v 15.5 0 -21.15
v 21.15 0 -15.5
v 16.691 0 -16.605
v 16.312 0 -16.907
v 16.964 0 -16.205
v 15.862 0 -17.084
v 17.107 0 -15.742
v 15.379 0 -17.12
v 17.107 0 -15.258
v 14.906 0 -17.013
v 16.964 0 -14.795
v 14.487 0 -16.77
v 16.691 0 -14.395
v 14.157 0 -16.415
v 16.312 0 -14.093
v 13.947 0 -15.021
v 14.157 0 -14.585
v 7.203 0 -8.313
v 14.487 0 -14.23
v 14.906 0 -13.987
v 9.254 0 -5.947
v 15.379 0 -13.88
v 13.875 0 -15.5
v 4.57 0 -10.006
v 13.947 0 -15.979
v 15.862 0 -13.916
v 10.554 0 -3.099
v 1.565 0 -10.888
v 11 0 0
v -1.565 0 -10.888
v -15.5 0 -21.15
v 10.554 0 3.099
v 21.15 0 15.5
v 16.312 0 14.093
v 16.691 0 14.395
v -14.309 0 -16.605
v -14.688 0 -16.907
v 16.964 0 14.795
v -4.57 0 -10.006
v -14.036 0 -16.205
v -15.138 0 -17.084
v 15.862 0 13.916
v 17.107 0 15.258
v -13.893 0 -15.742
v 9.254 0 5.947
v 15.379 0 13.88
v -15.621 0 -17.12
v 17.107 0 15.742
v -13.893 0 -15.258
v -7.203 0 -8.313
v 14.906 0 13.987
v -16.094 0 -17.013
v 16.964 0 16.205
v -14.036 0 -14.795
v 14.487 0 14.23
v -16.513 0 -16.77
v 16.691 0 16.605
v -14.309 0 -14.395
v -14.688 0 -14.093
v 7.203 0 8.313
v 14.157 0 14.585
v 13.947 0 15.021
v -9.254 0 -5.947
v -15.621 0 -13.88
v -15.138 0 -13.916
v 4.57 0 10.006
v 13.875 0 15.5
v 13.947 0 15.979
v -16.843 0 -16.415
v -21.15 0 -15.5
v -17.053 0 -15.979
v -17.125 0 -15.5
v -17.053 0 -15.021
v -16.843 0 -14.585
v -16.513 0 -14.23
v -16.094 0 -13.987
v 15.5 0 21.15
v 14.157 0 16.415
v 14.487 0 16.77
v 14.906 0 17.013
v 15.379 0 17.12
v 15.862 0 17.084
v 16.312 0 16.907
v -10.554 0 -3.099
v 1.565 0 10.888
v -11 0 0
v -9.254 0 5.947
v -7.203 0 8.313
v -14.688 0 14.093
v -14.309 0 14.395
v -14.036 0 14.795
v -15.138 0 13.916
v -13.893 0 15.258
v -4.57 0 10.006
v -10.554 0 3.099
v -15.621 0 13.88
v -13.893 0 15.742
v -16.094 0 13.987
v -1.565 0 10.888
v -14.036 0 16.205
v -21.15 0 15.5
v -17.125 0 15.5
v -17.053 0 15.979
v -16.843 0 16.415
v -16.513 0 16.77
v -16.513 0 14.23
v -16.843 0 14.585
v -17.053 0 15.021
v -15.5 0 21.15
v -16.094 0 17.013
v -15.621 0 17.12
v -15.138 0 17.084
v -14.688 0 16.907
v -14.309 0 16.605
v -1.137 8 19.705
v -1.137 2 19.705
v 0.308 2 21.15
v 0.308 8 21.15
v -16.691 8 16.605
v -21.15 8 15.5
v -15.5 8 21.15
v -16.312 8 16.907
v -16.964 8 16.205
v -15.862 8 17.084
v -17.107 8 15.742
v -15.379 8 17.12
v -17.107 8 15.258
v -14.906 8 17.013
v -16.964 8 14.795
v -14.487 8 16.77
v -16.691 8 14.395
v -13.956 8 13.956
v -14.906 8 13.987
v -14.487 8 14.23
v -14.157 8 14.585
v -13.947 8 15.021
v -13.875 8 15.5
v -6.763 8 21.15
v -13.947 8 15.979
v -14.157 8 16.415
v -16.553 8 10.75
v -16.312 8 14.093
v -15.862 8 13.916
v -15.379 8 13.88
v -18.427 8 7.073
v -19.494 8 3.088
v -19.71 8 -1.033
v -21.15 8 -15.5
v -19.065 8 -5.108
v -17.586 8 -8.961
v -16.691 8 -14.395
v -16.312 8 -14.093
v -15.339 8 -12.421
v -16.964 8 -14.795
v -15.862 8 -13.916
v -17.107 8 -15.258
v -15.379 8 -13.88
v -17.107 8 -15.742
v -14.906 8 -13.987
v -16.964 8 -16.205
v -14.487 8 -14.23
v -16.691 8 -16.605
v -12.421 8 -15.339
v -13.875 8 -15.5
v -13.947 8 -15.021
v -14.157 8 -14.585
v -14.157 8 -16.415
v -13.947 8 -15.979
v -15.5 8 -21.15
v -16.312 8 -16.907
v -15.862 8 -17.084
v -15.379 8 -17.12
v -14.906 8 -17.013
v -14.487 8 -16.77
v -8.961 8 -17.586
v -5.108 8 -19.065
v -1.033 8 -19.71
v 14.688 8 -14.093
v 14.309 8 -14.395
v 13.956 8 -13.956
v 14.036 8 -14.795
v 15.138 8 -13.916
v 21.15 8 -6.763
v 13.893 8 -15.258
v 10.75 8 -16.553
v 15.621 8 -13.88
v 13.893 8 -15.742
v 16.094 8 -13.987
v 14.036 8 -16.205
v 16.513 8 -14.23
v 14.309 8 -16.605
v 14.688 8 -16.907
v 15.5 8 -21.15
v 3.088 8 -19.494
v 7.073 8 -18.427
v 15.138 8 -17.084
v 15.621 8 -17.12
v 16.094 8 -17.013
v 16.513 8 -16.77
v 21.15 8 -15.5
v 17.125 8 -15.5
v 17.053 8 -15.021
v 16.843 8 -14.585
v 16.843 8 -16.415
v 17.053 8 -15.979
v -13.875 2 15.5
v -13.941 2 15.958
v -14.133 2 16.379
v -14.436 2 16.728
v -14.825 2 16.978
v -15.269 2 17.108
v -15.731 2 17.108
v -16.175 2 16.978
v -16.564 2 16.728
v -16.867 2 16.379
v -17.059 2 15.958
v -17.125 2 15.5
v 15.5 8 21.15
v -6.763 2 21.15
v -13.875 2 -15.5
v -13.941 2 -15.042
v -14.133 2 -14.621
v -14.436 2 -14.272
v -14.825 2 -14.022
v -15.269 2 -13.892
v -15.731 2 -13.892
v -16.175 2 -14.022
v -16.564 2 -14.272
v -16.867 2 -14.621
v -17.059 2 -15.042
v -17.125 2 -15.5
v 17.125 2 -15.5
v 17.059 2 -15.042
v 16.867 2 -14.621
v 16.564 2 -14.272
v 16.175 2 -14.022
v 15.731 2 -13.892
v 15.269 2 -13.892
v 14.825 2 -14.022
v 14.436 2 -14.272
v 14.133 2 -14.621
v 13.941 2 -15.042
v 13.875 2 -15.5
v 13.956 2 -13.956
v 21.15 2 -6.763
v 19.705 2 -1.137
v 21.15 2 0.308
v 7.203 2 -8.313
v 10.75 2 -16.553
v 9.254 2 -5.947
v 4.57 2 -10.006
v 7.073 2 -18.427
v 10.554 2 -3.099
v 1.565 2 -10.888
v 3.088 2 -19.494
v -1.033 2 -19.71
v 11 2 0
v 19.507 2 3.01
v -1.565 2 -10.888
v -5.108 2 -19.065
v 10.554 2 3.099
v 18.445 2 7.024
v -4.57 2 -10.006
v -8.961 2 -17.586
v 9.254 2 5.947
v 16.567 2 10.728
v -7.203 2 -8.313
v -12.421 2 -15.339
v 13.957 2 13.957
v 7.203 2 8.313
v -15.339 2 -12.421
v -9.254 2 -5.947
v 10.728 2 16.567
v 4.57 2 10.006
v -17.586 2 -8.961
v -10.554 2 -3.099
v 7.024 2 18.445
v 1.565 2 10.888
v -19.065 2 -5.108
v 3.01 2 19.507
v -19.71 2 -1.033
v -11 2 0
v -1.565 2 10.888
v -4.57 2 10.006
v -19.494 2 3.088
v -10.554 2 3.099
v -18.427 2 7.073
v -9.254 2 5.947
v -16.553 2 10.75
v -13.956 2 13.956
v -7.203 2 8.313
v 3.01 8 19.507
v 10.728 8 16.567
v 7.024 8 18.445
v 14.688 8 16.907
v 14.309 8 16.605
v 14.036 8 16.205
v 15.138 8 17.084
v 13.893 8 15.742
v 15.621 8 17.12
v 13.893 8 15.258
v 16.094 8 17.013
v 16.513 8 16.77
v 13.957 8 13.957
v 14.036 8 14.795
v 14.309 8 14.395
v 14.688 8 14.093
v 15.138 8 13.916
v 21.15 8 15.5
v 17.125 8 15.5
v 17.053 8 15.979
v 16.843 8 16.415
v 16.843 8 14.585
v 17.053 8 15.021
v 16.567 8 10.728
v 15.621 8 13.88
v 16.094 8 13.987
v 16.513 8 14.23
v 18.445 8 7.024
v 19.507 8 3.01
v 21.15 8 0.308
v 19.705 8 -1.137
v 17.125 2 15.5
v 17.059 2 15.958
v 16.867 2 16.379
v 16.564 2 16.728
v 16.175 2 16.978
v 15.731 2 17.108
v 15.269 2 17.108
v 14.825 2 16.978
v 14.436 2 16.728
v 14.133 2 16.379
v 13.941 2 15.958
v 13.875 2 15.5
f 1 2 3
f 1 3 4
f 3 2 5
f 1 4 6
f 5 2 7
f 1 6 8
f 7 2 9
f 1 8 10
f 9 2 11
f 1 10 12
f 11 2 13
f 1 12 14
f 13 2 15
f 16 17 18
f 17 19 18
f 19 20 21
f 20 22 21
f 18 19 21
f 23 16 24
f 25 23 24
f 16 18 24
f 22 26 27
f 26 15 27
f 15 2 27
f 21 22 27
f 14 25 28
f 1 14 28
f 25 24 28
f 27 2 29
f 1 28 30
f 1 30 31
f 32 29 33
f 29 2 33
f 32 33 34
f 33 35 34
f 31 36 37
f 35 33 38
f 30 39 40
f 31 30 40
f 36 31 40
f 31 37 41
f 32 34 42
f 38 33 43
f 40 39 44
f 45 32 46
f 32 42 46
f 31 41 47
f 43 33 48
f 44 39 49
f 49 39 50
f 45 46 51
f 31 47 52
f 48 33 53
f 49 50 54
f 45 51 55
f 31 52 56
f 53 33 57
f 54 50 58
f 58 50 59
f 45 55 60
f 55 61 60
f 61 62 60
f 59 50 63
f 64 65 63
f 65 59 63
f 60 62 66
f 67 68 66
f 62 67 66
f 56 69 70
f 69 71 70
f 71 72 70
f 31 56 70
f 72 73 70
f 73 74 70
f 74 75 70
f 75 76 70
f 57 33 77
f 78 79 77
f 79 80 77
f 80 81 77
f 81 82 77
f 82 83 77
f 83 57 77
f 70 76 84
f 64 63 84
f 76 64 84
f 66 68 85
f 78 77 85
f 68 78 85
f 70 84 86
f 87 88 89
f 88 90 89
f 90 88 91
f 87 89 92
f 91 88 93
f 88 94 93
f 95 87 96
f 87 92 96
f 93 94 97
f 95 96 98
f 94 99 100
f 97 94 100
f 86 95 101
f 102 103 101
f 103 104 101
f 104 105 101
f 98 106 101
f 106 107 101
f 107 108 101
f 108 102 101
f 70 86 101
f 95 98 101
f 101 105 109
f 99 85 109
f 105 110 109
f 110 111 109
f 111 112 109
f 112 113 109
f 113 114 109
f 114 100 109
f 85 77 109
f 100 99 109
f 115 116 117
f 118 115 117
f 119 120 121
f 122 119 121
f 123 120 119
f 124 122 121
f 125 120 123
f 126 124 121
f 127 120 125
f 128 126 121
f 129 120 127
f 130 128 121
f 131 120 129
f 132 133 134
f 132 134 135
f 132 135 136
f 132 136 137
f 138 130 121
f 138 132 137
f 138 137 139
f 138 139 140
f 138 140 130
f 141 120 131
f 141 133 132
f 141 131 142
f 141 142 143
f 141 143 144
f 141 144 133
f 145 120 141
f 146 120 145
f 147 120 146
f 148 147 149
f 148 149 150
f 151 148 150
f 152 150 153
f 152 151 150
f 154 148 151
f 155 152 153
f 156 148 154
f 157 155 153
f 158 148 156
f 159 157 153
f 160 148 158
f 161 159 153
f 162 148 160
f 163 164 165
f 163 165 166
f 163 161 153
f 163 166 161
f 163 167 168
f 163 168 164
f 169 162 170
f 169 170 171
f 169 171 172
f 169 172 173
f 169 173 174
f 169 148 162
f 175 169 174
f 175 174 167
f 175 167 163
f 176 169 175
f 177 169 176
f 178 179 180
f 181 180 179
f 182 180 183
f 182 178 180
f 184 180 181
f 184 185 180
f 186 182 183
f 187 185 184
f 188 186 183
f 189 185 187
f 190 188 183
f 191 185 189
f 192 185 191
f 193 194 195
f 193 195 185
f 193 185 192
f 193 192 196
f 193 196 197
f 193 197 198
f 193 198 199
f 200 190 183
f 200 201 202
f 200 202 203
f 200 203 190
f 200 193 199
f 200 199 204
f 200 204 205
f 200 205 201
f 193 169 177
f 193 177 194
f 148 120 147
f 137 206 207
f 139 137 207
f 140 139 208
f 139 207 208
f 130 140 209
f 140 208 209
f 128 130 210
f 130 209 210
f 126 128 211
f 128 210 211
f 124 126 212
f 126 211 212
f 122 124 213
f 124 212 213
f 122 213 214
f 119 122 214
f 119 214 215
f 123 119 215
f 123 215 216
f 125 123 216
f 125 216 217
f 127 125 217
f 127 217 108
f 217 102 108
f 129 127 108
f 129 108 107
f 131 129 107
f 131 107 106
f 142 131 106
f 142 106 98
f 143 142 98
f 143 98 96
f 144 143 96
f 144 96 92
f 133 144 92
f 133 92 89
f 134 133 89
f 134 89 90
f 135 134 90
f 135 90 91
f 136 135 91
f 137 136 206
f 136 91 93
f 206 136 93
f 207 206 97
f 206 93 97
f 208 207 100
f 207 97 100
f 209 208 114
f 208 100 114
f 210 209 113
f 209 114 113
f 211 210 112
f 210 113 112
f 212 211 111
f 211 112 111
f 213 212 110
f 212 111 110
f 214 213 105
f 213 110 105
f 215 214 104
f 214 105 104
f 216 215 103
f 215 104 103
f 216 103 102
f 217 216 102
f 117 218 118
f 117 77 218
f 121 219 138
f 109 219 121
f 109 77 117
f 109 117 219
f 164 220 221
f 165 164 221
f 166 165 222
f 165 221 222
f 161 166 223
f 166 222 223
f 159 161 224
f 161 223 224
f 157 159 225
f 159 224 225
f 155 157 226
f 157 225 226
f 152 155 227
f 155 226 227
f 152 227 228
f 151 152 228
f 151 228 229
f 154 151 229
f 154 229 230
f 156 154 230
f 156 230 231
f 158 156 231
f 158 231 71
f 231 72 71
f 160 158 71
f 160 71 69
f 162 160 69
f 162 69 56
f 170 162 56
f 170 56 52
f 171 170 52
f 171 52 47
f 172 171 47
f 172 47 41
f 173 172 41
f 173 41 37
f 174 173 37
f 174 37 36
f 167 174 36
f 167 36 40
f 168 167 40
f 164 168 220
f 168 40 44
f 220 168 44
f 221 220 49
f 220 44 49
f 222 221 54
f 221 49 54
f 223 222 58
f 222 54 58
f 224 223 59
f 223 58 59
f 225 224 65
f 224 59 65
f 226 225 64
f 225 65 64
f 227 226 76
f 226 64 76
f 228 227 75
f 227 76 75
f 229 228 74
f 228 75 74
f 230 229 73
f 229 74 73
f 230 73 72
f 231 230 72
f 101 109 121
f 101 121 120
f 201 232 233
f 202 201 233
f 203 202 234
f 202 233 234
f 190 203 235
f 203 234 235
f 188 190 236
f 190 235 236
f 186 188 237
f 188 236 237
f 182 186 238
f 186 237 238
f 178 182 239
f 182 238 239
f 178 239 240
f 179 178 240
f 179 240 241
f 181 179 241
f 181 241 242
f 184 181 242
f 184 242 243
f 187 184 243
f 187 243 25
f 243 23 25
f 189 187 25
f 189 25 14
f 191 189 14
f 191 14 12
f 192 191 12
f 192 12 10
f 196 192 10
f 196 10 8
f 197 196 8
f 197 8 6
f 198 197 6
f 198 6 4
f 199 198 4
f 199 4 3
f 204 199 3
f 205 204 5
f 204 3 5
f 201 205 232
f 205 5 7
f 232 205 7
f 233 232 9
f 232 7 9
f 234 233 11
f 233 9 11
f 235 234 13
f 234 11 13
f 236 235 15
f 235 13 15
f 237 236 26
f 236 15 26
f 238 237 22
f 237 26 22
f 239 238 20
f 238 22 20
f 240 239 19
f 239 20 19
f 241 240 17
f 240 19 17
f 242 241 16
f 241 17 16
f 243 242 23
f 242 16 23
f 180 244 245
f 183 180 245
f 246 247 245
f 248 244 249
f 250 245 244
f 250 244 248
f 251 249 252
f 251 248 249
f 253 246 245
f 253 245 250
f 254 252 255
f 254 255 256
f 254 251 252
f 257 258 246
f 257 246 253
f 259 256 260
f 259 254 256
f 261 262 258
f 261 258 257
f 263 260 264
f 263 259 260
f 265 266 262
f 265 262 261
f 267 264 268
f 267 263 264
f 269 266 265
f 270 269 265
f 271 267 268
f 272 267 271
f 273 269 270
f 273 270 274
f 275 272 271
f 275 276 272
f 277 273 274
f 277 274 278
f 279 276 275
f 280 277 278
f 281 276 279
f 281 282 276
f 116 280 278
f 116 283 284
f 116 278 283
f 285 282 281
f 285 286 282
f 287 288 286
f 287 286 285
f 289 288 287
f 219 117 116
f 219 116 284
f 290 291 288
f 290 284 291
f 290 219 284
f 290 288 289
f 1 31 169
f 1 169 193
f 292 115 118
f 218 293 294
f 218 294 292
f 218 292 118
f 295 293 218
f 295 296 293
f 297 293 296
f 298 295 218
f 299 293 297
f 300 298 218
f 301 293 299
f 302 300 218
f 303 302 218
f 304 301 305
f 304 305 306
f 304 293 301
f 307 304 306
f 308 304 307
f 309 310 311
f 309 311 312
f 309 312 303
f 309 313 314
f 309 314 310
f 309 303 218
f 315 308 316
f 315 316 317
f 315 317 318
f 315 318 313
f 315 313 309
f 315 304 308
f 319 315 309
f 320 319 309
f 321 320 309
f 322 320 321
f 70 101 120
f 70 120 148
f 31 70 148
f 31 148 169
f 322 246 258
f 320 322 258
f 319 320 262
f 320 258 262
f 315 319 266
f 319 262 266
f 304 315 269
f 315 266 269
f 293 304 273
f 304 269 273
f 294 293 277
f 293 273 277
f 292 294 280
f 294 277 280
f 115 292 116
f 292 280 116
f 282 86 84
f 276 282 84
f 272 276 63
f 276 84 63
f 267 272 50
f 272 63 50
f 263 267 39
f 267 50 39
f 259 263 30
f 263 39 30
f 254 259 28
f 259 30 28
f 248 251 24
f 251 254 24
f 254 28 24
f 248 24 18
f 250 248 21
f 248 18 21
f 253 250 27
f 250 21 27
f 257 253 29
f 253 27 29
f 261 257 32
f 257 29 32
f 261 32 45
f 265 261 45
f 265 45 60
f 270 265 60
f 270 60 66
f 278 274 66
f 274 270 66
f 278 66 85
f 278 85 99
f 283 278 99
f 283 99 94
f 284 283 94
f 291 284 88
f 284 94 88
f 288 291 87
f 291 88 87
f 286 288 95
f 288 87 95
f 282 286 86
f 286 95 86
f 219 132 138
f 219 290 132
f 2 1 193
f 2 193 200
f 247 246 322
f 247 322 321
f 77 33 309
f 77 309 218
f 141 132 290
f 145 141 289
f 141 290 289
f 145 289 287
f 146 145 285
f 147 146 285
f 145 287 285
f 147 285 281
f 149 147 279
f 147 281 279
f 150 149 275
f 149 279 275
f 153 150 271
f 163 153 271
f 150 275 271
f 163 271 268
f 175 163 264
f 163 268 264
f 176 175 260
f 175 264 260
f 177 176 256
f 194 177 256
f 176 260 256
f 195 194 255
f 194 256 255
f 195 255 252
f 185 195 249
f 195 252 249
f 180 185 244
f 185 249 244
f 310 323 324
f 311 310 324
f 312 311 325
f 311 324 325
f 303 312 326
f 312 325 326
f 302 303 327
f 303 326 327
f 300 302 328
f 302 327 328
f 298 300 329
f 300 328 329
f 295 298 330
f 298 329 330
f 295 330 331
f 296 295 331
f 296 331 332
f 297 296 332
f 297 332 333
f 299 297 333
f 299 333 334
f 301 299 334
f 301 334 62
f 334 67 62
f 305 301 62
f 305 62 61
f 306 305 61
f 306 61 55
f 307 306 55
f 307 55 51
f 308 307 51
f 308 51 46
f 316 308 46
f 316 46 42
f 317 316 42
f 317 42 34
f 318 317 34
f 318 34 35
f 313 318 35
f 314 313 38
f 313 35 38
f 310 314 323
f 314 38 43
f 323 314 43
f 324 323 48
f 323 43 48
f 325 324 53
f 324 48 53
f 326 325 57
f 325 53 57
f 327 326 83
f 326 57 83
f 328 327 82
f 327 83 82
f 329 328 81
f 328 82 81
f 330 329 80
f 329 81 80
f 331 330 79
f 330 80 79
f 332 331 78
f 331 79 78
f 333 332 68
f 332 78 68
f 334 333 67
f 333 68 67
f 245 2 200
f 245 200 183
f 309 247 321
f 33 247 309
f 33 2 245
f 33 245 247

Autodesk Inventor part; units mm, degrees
ref_plane "YZ Plane" through (0, 0, 0) normal (1, 0, 0) x (0, 1, 0)
ref_plane "XZ Plane" through (0, 0, 0) normal (0, 1, 0) x (-1, 0, 0)
ref_plane "XY Plane" through (0, 0, 0) normal (0, 0, 1) x (1, 0, 0)
sketch "Sketch1" plane through (0, 0, 0) normal (0, 1, 0) x (-1, 0, 0)
  line L0 (-15.5, 21.15) -> (15.5, 21.15)
  line L1 (21.15, 15.5) -> (21.15, -15.5)
  line L2 (15.5, -21.15) -> (-15.5, -21.15)
  line L3 (-21.15, -15.5) -> (-21.15, 15.5)
  line L4 (-21.15, 21.15) -> (21.15, -21.15) construction
  line L5 (21.15, 21.15) -> (-21.15, -21.15) construction
  line L6 (-15.5, 15.5) -> (15.5, 15.5)
  line L7 (15.5, 15.5) -> (15.5, -15.5)
  line L8 (15.5, -15.5) -> (-15.5, -15.5)
  line L9 (-15.5, -15.5) -> (-15.5, 15.5)
  line L10 (-15.5, 15.5) -> (15.5, -15.5) construction
  line L11 (15.5, 15.5) -> (-15.5, -15.5) construction
  circle A0 centre (0, 0) radius 11
  circle A1 centre (15.5, 15.5) radius 1.625
  circle A2 centre (15.5, -15.5) radius 1.625
  circle A3 centre (-15.5, -15.5) radius 1.625
  circle A4 centre (-15.5, 15.5) radius 1.625
  line L12 (15.5, -15.5) -> (15.5, -21.15)
  line L13 (21.15, -15.5) -> (15.5, -21.15)
  line L14 (-15.5, -21.15) -> (-21.15, -15.5)
  line L15 (-21.15, 15.5) -> (-15.5, 21.15)
  line L16 (15.5, 21.15) -> (21.15, 15.5)
  line L17 (0, -15.5) -> (0, -21.15)
  line L18 (0, -15.5) -> (0, -18.325)
  line L19 (0, -18.325) -> (0, -21.15)
  circle A5 centre (0, 0) radius 19.7375
  dimension "d0" = 42.3
  dimension "d1" = 42.3
  dimension "d2" = 31
  dimension "d3" = 31
  dimension "d4" = 22
  dimension "d5" = 3.25
  dimension "d6" = 3.25
  dimension "d7" = 3.25
  dimension "d8" = 3.25
extrude "Extrusion1" add sketch "Sketch1" along normal blind 2 contours L0 L16 L1 L13 L12 A2 L7 A5 A1 L6 A4 L9 A3 L8 L17 L2 L14 L3 L15 | L2 L17 A5 L8 A2 L12 | A5 L8 L17 | L17 L8 A5 | L8 A5 L7 A2 | A5 L9 L6 L7 L8 | L8 A3 L9 A5 | A5 L9 | L7 A5 | L9 A4 L6 A5 | A5 L6 A1 L7 | A5 L6
sketch "Sketch2" plane through (0, 2, 0) normal (0, 1, 0) x (1, 0, 0)
  line L0 (-15.5, 21.15) -> (15.5, 21.15)
  line L1 (21.15, 15.5) -> (21.15, -15.5)
  line L2 (15.5, -21.15) -> (-15.5, -21.15)
  line L3 (-21.15, -15.5) -> (-21.15, 15.5)
  line L4 (-21.15, 21.15) -> (21.15, -21.15) construction
  line L5 (21.15, 21.15) -> (-21.15, -21.15) construction
  line L6 (-15.5, 15.5) -> (15.5, 15.5)
  line L7 (15.5, 15.5) -> (15.5, -15.5)
  line L8 (15.5, -15.5) -> (-15.5, -15.5)
  line L9 (-15.5, -15.5) -> (-15.5, 15.5)
  line L10 (-15.5, 15.5) -> (15.5, -15.5) construction
  line L11 (15.5, 15.5) -> (-15.5, -15.5) construction
  circle A0 centre (0, 0) radius 11
  circle A1 centre (15.5, 15.5) radius 1.625
  circle A2 centre (15.5, -15.5) radius 1.625
  circle A3 centre (-15.5, -15.5) radius 1.625
  circle A4 centre (-15.5, 15.5) radius 1.625
  line L12 (15.5, -15.5) -> (15.5, -21.15)
  line L13 (21.15, -15.5) -> (15.5, -21.15)
  line L14 (-15.5, -21.15) -> (-21.15, -15.5)
  line L15 (-21.15, 15.5) -> (-15.5, 21.15)
  line L16 (15.5, 21.15) -> (21.15, 15.5)
  line L17 (0, -15.5) -> (0, -21.15)
  line L18 (0, -15.5) -> (0, -18.325)
  line L19 (0, -18.325) -> (0, -21.15)
  circle A5 centre (0, 0) radius 19.7375
  circle A6 centre (0, 0) radius 11 projected
  line L20 (-15.5, -21.15) -> (15.5, -21.15) projected
  line L21 (-13.9565, -13.9565) -> (-6.763, -21.15)
  line L22 (0, 0) -> (7.7782, -7.7782) construction
  line L23 (13.9565, 13.9565) -> (21.15, 6.763)
  circle A7 centre (0, 0) radius 14.7375 construction
  line L24 (-1.1373, -19.7047) -> (0.308, -21.15)
  line L25 (19.7047, 1.1373) -> (21.15, -0.308)
  point P0 (-10.421, -10.421)
  point P1 (10.421, 10.421)
  point P2 (20.4274, 0.4146)
  point P3 (15.5, 12.2196)
  point P4 (15.5, 12.413)
  point P5 (-12.413, -15.5)
  point P6 (-12.2196, -15.5)
  point P7 (0, -20.842)
  point P8 (21.15, -0.308)
  dimension "d15" = 22
  dimension "d11" = 42.3
  dimension "d12" = 42.3
  dimension "d13" = 31
  dimension "d14" = 31
  dimension "d16" = 3.25
  dimension "d17" = 3.25
  dimension "d18" = 3.25
  dimension "d19" = 3.25
  dimension "d23" = 5
  dimension "d24" = 5
extrude "Extrusion2" add sketch "Sketch2" along normal blind 6 contours L0 L16 L1 L23 L7 A1 L6 A5 A4 L9 A3 L8 L21 L2 L14 L3 L15 | L1 L13 L12 A2 L7 A5 L25 | L23 A5 L6 A1 L7 | L8 A3 L9 A5 L21 | L2 L24 L17 A5 L8 A2 L12 | L7 A2 L8 A5 | L24 A5 L17 | A5 L9 A4 L6
properties part number "Pumphousing"
